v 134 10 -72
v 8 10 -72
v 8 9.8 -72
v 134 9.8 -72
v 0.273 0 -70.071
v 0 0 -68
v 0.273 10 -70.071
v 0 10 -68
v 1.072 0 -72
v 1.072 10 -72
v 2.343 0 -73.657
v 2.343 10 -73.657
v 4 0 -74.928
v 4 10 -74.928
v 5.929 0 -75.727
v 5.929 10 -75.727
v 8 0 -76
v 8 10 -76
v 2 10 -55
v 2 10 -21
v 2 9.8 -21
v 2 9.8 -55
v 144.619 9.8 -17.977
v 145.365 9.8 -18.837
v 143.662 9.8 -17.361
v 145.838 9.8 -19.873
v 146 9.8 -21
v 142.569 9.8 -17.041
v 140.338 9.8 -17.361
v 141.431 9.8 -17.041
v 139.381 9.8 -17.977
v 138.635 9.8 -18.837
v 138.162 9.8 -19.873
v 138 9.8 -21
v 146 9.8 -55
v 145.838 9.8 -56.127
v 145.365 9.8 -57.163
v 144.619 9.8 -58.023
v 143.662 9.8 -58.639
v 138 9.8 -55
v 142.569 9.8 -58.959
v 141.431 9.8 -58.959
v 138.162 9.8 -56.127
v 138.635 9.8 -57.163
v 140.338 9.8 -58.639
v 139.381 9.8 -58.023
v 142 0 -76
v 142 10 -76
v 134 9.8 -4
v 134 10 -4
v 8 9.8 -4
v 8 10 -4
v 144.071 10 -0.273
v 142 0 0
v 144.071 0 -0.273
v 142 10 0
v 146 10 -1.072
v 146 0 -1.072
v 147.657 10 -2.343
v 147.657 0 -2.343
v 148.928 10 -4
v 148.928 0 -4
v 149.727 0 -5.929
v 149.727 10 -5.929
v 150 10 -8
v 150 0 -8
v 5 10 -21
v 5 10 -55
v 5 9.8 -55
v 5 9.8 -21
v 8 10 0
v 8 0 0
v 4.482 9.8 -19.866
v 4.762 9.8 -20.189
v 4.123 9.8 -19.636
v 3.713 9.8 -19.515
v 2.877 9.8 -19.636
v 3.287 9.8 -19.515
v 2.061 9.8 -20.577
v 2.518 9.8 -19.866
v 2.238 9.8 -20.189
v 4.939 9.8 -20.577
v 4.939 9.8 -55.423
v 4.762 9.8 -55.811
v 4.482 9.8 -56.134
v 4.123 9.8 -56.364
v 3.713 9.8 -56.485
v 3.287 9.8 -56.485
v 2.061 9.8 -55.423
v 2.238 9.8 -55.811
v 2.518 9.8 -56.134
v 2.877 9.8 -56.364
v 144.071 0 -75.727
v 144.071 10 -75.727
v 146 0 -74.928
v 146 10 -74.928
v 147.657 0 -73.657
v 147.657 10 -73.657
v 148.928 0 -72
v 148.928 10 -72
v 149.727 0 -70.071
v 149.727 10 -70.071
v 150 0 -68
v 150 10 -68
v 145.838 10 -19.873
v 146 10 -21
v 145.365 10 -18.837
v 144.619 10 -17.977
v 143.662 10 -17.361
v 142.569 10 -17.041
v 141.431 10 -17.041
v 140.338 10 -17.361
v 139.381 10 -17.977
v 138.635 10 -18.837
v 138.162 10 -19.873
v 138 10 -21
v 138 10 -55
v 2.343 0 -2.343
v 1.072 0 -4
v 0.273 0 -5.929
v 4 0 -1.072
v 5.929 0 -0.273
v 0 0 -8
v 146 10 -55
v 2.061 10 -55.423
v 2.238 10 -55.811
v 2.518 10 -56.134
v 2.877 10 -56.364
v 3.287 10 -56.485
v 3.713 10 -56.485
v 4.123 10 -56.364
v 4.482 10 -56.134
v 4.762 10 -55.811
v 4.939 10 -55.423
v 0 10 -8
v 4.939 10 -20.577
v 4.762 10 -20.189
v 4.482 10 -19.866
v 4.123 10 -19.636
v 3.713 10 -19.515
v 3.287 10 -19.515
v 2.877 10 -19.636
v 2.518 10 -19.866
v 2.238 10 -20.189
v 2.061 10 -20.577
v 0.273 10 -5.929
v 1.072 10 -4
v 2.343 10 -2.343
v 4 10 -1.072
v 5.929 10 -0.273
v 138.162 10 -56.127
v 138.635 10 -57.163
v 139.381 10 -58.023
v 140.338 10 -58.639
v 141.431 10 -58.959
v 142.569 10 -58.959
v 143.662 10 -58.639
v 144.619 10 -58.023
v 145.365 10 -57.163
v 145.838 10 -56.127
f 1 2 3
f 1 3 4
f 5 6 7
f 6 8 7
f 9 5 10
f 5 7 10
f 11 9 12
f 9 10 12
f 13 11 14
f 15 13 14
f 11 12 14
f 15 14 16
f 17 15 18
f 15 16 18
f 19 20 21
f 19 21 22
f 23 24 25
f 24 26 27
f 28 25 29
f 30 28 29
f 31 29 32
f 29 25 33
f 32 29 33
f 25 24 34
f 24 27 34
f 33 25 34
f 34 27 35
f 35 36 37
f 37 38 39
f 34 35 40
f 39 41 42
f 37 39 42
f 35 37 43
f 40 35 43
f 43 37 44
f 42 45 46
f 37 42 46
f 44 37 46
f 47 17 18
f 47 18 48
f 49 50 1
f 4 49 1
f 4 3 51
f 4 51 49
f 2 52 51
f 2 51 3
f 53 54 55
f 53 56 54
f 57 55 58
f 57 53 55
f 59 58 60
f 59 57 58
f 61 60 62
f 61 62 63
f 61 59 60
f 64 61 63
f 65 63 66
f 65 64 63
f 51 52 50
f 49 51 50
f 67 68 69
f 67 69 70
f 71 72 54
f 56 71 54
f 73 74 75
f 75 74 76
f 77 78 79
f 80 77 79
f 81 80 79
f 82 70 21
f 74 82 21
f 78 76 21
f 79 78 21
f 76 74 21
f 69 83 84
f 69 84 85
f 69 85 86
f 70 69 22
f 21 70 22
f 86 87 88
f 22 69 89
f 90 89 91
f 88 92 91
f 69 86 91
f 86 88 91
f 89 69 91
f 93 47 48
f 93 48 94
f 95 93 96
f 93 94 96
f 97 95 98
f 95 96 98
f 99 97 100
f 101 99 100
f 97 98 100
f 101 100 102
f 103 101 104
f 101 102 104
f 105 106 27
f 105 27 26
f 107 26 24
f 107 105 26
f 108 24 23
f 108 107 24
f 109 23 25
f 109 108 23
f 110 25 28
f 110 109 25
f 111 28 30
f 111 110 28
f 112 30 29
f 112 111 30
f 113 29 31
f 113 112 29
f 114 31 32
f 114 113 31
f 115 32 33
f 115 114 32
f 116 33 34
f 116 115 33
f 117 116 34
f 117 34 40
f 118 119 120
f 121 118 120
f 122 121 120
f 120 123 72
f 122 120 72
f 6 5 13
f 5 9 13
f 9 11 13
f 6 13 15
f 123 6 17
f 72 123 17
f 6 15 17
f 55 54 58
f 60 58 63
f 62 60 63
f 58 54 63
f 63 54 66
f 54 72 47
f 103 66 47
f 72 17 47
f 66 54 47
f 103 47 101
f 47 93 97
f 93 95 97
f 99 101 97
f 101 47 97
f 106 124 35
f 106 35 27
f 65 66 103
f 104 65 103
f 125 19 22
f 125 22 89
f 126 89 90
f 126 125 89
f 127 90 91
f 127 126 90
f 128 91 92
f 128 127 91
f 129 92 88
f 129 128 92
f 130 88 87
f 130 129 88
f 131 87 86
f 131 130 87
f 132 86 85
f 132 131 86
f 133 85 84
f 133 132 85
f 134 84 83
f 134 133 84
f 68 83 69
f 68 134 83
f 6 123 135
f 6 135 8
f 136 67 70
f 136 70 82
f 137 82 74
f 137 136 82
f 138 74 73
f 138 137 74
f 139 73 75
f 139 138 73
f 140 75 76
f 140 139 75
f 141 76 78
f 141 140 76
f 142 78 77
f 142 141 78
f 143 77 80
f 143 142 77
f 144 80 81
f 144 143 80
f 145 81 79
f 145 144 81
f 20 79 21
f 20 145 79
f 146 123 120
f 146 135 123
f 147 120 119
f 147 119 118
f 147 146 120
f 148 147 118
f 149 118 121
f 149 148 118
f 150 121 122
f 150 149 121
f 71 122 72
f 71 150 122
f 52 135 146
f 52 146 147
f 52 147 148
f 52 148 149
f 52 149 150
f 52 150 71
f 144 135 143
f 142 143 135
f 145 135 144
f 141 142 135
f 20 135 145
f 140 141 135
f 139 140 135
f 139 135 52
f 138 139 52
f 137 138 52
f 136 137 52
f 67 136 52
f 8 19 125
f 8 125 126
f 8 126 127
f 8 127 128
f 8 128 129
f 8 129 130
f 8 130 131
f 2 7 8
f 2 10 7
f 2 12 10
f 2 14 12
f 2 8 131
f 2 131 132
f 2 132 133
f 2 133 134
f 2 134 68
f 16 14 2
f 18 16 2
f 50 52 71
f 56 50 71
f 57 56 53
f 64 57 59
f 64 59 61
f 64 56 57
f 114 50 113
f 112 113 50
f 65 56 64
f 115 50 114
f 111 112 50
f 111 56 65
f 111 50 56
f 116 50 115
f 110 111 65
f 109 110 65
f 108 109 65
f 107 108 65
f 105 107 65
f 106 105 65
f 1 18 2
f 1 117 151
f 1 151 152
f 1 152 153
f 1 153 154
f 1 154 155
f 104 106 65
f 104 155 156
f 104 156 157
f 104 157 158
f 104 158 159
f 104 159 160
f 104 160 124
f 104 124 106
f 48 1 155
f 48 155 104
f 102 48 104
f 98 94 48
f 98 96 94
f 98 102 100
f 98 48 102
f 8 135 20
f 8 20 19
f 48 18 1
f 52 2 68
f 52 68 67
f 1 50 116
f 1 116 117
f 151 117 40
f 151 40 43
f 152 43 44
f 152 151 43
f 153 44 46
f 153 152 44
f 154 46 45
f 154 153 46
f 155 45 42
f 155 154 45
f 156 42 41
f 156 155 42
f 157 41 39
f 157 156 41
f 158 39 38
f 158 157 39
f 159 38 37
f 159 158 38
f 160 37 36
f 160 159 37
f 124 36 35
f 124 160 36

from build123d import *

# Parameters (mm, degrees)
SKETCH1_W           = 150
SKETCH1_H           = 76
BOSS_EXTRUDE1_DEPTH = 10
SKETCH2_W           = 126
SKETCH2_H           = 68
CUT_EXTRUDE1_DEPTH  = 0.2
FILLET1_R           = 8


with BuildPart() as part:
    # Sketch1 → Boss-Extrude1 (new body)
    with BuildSketch(Plane(origin=(0, 0, 0), x_dir=(1, 0, 0), z_dir=(0, 1, 0))):
        with Locations((75, 38)):
            Rectangle(SKETCH1_W, SKETCH1_H)
    extrude(amount=BOSS_EXTRUDE1_DEPTH)

    # Sketch2 → Cut-Extrude1 (cut)
    with BuildSketch(Plane(origin=(0, 10, 0), x_dir=(1, 0, 0), z_dir=(0, 1, 0))):
        with Locations((71, 38)):
            Rectangle(SKETCH2_W, SKETCH2_H)
        with BuildLine():
            Line((138, 21), (138, 55))
            ThreePointArc((138, 55), (142, 59), (146, 55))
            Line((146, 55), (146, 21))
            ThreePointArc((146, 21), (142, 17), (138, 21))
        make_face()
        with BuildLine():
            Line((5, 55), (5, 21))
            ThreePointArc((5, 21), (3.5, 19.5), (2, 21))
            Line((2, 21), (2, 55))
            ThreePointArc((2, 55), (3.5, 56.5), (5, 55))
        make_face()
    extrude(amount=-CUT_EXTRUDE1_DEPTH, mode=Mode.SUBTRACT)

    # Fillet1
    fillet1_edges = [part.edges().sort_by_distance(p)[0] for p in [
        (0, 5, -76),
        (150, 5, -76),
        (150, 5, 0),
        (0, 5, 0),
    ]]
    fillet(fillet1_edges, radius=FILLET1_R)


solid = part.part
